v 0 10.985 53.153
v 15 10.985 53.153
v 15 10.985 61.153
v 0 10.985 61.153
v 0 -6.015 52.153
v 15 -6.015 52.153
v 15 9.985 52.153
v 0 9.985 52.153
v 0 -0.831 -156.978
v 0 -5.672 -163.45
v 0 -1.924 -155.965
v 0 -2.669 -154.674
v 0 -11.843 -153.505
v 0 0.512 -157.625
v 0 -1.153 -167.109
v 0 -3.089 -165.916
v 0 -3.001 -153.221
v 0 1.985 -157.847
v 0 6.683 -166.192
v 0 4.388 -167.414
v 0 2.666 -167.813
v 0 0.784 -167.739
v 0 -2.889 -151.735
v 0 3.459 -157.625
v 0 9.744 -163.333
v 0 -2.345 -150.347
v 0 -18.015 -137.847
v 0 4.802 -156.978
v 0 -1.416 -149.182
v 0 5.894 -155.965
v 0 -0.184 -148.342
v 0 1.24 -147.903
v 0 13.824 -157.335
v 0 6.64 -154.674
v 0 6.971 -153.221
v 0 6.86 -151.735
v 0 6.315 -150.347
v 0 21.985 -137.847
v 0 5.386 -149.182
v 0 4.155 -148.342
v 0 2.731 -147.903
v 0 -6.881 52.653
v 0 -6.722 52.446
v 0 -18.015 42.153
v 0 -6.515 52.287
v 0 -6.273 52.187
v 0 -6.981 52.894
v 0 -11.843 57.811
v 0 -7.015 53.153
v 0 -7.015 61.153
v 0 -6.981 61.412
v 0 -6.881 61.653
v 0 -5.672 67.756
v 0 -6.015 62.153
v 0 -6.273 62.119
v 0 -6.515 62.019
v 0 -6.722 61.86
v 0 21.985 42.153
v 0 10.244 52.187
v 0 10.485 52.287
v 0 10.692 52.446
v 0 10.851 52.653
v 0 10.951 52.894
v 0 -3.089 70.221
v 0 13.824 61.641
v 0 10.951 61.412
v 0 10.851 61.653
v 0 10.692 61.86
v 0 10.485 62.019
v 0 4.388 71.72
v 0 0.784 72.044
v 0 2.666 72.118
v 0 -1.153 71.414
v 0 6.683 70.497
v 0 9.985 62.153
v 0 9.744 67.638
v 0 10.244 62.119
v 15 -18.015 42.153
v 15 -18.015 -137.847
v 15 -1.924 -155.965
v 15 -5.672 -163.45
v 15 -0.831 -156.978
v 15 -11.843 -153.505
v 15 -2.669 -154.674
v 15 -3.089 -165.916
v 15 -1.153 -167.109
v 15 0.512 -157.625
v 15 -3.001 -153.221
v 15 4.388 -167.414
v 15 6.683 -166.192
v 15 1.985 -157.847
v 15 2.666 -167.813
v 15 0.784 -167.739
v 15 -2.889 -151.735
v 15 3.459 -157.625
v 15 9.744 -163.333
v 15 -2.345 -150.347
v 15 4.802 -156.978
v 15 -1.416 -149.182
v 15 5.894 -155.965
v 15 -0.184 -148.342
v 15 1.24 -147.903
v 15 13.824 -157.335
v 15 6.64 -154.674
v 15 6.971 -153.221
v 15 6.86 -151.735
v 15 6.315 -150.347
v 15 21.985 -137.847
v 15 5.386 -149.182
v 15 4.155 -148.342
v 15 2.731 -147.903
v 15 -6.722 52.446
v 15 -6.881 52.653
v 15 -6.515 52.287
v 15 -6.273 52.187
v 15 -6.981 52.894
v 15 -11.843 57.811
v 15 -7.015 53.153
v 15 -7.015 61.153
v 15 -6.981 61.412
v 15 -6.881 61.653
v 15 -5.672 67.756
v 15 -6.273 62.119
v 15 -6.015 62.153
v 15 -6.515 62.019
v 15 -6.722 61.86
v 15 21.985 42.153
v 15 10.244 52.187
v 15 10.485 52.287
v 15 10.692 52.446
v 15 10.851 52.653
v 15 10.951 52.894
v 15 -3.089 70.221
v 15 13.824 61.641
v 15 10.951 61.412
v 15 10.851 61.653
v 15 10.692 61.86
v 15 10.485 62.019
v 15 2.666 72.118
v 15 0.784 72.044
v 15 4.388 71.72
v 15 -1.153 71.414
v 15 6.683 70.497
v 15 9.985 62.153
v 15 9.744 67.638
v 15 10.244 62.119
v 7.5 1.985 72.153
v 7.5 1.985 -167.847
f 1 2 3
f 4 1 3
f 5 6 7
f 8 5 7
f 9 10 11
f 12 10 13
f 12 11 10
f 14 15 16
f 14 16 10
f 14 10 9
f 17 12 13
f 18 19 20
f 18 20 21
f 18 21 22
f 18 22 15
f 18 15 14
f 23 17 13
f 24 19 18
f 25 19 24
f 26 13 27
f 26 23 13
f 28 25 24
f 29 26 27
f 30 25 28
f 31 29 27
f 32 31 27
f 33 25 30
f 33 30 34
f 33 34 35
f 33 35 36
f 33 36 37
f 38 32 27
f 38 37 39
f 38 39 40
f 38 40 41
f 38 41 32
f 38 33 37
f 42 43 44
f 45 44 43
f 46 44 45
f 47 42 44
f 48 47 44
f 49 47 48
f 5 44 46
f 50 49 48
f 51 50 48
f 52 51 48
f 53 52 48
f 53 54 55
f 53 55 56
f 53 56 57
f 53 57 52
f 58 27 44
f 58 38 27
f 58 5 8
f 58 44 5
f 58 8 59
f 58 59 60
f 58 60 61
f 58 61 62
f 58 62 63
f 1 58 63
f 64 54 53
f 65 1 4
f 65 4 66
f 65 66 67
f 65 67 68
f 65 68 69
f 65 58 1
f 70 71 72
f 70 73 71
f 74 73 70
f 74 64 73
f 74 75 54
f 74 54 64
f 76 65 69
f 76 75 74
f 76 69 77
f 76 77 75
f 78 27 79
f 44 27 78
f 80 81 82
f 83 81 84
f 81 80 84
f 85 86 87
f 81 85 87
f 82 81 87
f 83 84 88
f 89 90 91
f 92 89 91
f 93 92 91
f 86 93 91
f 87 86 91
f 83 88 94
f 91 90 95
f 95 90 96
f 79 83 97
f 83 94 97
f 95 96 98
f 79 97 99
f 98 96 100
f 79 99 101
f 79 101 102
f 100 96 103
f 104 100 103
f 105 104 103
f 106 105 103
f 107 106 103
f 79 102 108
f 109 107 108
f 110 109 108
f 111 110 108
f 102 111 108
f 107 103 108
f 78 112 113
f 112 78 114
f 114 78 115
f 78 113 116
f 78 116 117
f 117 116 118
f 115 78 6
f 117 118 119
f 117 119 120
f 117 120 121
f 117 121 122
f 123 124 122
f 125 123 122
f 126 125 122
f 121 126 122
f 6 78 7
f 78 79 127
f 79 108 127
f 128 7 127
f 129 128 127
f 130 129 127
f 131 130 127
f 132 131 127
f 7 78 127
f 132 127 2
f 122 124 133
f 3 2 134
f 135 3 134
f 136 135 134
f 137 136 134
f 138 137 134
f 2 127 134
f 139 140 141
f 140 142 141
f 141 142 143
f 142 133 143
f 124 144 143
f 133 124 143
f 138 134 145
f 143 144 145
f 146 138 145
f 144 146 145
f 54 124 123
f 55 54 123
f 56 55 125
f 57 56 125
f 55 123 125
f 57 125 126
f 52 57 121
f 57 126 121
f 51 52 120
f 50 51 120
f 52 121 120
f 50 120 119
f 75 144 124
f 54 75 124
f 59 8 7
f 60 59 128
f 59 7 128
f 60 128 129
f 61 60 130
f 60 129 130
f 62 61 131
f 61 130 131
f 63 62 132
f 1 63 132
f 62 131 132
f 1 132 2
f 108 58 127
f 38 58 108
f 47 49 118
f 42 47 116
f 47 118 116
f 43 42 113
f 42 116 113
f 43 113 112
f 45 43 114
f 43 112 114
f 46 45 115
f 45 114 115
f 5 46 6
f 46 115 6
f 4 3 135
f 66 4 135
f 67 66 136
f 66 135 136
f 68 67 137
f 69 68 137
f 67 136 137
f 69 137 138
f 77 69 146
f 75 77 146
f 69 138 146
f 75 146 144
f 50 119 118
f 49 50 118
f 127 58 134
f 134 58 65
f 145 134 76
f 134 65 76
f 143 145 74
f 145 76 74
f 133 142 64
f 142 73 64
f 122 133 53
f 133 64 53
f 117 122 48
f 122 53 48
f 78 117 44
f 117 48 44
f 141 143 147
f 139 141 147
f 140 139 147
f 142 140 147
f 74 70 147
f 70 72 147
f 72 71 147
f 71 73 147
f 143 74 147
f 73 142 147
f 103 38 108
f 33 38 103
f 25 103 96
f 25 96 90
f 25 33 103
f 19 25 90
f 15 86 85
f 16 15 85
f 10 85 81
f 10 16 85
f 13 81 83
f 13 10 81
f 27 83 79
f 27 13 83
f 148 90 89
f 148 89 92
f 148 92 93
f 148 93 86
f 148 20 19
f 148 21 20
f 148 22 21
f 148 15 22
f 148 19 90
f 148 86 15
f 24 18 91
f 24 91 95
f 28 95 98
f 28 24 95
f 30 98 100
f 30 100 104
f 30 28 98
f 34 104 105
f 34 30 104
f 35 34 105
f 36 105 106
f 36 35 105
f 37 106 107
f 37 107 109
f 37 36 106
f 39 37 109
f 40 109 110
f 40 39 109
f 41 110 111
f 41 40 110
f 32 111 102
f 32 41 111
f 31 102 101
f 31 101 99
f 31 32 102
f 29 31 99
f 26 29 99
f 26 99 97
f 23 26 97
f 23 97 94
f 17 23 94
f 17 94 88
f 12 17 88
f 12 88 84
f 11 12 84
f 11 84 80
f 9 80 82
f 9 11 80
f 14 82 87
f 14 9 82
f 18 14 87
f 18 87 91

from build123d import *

# Parameters (mm, degrees)
SKETCH1_R           = 5
BOSS_EXTRUDE1_DEPTH = 15
CUT_EXTRUDE1_DEPTH  = 15


with BuildPart() as part:
    # Sketch1 → Boss-Extrude1 (new body)
    with BuildSketch(Plane(origin=(0, 0, 0), x_dir=(0, 0, -1), z_dir=(1, 0, 0))):
        with BuildLine():
            Line((-42.152698982, 21.985337207), (137.847301018, 21.985337207))
            add(Edge.make_bspline(
                [(137.847301018, 21.985337207), (197.847301018, 1.985337207), (137.847301018, -18.014662793)],
                knots=[0, 0, 0, 1, 1, 1], degree=2))
            Line((137.847301018, -18.014662793), (-42.152698982, -18.014662793))
            add(Edge.make_bspline(
                [(-42.152698982, 21.985337207), (-102.152698982, 1.985337207), (-42.152698982, -18.014662793)],
                knots=[0, 0, 0, 1, 1, 1], degree=2))
        make_face()
        with Locations((-57.152698982, 1.985337207)):
            Circle(SKETCH1_R, mode=Mode.SUBTRACT)
        with Locations((152.847301018, 1.985337207)):
            Circle(SKETCH1_R, mode=Mode.SUBTRACT)
    extrude(amount=BOSS_EXTRUDE1_DEPTH)

    # Sketch3 → Cut-Extrude1 (cut)
    with BuildSketch(Plane(origin=(15, 0, 0), x_dir=(0, 0, -1), z_dir=(1, 0, 0))):
        with BuildLine():
            Line((-53.152698982, 10.985337207), (-61.152698982, 10.985337207))
            ThreePointArc((-61.152698982, 10.985337207), (-61.859805763, 10.692443988), (-62.152698982, 9.985337207))
            Line((-62.152698982, 9.985337207), (-62.152698982, -6.014662793))
            ThreePointArc((-62.152698982, -6.014662793), (-61.859805763, -6.721769574), (-61.152698982, -7.014662793))
            Line((-61.152698982, -7.014662793), (-53.152698982, -7.014662793))
            ThreePointArc((-53.152698982, -7.014662793), (-52.4455922, -6.721769574), (-52.152698982, -6.014662793))
            Line((-52.152698982, -6.014662793), (-52.152698982, 9.985337207))
            ThreePointArc((-52.152698982, 9.985337207), (-52.4455922, 10.692443988), (-53.152698982, 10.985337207))
        make_face()
    extrude(amount=-CUT_EXTRUDE1_DEPTH, mode=Mode.SUBTRACT)


solid = part.part
